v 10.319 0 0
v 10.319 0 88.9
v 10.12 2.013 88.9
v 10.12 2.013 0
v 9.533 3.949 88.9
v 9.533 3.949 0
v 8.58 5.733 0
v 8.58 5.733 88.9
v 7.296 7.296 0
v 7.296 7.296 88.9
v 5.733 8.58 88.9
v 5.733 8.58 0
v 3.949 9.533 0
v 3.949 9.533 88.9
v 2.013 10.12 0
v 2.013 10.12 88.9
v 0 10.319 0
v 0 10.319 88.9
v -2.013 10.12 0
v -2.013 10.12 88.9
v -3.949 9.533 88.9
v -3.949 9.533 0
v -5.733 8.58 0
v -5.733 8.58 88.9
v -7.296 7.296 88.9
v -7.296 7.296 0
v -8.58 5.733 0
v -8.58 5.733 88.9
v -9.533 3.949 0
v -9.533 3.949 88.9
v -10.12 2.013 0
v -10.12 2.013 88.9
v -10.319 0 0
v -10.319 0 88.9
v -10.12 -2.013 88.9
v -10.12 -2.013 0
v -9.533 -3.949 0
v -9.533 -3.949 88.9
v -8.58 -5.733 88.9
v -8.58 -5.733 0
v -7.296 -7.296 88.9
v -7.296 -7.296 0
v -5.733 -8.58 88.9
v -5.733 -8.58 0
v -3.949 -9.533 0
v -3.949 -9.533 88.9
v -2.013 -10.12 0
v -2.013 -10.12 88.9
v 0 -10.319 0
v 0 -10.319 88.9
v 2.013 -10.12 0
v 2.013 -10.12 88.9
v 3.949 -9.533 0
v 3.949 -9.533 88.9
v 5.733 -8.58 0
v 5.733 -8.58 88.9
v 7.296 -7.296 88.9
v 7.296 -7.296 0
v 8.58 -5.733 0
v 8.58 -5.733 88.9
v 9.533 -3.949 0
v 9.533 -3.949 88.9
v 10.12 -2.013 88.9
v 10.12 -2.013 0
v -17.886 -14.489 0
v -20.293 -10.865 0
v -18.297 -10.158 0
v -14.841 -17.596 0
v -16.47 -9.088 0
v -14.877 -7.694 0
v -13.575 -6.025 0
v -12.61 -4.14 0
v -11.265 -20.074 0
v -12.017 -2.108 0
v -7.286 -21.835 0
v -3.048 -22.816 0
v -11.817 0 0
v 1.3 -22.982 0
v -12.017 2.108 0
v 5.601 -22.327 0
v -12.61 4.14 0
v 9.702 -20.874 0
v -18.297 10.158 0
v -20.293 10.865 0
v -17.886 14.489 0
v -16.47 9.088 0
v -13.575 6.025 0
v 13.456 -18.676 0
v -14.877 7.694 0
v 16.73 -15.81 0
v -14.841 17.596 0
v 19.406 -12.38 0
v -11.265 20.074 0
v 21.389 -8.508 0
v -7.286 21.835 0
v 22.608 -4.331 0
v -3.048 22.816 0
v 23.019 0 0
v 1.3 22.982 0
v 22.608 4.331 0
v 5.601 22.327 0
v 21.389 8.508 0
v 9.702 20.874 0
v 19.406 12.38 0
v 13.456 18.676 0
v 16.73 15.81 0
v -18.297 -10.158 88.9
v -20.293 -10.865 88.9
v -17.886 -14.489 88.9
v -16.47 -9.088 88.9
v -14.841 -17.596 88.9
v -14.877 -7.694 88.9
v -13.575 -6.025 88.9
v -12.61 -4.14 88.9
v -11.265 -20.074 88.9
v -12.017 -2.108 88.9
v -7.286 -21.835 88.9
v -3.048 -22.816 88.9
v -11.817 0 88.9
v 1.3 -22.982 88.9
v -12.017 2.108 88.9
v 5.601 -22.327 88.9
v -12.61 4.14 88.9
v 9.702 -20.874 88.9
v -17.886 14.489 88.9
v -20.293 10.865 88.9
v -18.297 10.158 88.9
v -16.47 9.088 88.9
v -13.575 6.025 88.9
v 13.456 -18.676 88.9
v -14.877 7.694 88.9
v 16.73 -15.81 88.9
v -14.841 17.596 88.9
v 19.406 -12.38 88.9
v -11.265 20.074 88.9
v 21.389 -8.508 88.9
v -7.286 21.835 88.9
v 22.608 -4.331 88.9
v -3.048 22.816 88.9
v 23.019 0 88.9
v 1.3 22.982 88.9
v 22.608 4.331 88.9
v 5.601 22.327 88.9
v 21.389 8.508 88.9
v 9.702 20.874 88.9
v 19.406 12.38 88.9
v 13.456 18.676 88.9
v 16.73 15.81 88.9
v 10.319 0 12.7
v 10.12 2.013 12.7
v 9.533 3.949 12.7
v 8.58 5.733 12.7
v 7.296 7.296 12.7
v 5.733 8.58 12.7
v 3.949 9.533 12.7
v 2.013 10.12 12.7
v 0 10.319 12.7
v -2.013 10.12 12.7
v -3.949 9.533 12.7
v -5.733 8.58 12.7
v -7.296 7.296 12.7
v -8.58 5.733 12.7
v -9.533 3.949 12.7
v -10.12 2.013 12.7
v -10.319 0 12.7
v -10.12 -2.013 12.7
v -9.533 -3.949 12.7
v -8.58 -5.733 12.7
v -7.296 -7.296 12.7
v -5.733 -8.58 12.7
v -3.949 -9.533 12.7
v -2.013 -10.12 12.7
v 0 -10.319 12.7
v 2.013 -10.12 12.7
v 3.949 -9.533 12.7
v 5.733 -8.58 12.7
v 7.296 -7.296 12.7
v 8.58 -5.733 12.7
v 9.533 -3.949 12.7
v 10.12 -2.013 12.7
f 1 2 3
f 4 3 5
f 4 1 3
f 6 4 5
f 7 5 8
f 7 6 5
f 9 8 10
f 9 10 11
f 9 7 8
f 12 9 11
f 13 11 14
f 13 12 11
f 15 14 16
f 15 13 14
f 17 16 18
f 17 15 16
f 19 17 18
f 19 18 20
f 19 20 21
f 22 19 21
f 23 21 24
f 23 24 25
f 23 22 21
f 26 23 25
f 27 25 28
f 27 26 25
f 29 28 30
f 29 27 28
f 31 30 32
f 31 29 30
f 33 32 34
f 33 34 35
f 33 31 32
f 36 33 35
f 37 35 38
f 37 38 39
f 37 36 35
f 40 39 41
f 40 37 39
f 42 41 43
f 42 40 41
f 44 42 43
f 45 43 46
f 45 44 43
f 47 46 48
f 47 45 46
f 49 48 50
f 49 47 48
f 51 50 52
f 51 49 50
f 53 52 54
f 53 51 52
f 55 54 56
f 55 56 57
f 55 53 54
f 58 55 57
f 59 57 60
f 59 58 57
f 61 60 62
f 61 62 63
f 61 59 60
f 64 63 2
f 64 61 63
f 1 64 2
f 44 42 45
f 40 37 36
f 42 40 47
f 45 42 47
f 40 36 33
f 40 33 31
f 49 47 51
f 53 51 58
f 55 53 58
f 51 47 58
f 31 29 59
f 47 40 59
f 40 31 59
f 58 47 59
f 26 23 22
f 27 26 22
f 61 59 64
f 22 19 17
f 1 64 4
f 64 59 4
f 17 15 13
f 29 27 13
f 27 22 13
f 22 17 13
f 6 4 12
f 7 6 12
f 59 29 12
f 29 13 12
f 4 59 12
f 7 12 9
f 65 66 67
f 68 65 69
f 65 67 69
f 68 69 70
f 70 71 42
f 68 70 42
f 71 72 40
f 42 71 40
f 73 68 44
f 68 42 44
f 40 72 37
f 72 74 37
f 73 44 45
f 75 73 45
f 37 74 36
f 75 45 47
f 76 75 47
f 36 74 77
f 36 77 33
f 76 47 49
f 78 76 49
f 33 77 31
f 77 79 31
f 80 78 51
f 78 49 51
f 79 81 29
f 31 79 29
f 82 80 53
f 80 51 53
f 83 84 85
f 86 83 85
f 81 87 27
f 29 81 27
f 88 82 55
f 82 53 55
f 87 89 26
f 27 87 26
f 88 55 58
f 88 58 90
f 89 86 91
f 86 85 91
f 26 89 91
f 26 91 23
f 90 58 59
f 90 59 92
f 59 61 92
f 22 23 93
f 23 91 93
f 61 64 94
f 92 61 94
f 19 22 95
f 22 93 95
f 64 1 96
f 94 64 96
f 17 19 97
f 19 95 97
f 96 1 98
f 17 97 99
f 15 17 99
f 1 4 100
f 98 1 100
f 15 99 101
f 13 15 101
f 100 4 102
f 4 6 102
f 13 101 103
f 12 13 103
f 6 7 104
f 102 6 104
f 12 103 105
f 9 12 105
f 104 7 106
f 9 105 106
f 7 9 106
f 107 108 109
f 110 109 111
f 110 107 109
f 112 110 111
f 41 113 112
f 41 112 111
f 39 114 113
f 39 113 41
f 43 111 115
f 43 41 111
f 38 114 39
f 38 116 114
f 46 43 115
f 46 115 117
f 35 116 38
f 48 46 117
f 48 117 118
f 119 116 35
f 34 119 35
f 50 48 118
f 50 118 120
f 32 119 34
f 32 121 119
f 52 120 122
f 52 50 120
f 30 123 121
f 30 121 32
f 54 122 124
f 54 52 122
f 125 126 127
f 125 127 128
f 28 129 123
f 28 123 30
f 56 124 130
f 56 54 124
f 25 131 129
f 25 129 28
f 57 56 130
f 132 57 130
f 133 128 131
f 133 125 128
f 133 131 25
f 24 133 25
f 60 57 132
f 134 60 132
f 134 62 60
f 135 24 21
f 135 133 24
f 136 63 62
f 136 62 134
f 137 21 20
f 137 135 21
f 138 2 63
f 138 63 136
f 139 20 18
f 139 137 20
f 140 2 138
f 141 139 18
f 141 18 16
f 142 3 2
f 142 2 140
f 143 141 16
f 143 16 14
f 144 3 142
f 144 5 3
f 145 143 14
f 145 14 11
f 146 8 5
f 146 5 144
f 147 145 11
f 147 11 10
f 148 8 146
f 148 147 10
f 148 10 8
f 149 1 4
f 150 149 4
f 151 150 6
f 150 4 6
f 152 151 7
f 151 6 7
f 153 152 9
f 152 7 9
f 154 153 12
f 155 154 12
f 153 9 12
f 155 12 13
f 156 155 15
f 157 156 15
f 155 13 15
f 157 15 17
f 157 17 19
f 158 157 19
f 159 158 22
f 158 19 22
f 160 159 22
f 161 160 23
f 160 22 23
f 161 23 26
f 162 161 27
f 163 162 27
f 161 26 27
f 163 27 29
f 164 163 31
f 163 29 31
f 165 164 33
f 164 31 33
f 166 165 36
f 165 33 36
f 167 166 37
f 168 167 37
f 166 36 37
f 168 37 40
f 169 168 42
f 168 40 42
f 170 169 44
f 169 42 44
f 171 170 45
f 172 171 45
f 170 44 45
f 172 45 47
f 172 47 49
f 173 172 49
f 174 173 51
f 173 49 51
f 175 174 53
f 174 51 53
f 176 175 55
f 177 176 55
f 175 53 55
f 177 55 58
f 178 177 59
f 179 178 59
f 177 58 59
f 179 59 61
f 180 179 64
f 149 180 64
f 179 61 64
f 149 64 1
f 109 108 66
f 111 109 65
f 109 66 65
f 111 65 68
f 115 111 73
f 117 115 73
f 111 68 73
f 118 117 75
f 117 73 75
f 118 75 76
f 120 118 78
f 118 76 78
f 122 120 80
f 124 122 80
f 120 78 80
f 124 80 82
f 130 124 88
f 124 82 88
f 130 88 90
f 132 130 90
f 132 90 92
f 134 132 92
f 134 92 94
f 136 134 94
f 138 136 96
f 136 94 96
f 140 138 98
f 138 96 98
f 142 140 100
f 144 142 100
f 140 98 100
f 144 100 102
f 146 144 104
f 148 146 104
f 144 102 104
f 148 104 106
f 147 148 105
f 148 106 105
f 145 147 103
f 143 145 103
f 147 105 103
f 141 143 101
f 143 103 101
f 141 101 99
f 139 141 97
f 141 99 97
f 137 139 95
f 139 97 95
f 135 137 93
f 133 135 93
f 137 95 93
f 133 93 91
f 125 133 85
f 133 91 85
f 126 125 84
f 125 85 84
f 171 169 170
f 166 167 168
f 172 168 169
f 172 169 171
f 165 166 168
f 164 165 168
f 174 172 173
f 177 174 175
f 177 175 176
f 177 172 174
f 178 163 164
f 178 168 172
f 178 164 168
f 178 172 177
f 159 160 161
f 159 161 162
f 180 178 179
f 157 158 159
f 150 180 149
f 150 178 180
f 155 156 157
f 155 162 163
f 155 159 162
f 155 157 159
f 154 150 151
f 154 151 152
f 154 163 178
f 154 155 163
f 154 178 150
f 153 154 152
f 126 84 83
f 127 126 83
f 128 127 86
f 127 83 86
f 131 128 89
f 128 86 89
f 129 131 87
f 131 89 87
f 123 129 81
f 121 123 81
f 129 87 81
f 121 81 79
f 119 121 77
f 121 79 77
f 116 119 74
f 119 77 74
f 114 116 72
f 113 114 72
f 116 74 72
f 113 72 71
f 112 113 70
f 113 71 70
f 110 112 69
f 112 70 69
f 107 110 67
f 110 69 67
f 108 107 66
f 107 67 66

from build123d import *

# Parameters (mm, degrees)
F0_R     = 10.31875
F1_DEPTH = 12.7
F2_DEPTH = 88.9


with BuildPart() as f1:
    # F0 (on Top) → F1 (new body)
    with BuildSketch(Plane.XY):
        Circle(F0_R)
    extrude(amount=F1_DEPTH)


with BuildPart() as f2:
    # F0 (on Top) → F2 (new body)
    with BuildSketch(Plane.XY):
        with BuildLine():
            ThreePointArc((-20.29315, 10.865124), (-11.816972, 0), (-20.29315, -10.865124))
            ThreePointArc((-20.29315, -10.865124), (23.01875, 0), (-20.29315, 10.865124))
        make_face()
        Circle(F0_R, mode=Mode.SUBTRACT)
    extrude(amount=F2_DEPTH)


solid = Compound([f1.part, f2.part])
